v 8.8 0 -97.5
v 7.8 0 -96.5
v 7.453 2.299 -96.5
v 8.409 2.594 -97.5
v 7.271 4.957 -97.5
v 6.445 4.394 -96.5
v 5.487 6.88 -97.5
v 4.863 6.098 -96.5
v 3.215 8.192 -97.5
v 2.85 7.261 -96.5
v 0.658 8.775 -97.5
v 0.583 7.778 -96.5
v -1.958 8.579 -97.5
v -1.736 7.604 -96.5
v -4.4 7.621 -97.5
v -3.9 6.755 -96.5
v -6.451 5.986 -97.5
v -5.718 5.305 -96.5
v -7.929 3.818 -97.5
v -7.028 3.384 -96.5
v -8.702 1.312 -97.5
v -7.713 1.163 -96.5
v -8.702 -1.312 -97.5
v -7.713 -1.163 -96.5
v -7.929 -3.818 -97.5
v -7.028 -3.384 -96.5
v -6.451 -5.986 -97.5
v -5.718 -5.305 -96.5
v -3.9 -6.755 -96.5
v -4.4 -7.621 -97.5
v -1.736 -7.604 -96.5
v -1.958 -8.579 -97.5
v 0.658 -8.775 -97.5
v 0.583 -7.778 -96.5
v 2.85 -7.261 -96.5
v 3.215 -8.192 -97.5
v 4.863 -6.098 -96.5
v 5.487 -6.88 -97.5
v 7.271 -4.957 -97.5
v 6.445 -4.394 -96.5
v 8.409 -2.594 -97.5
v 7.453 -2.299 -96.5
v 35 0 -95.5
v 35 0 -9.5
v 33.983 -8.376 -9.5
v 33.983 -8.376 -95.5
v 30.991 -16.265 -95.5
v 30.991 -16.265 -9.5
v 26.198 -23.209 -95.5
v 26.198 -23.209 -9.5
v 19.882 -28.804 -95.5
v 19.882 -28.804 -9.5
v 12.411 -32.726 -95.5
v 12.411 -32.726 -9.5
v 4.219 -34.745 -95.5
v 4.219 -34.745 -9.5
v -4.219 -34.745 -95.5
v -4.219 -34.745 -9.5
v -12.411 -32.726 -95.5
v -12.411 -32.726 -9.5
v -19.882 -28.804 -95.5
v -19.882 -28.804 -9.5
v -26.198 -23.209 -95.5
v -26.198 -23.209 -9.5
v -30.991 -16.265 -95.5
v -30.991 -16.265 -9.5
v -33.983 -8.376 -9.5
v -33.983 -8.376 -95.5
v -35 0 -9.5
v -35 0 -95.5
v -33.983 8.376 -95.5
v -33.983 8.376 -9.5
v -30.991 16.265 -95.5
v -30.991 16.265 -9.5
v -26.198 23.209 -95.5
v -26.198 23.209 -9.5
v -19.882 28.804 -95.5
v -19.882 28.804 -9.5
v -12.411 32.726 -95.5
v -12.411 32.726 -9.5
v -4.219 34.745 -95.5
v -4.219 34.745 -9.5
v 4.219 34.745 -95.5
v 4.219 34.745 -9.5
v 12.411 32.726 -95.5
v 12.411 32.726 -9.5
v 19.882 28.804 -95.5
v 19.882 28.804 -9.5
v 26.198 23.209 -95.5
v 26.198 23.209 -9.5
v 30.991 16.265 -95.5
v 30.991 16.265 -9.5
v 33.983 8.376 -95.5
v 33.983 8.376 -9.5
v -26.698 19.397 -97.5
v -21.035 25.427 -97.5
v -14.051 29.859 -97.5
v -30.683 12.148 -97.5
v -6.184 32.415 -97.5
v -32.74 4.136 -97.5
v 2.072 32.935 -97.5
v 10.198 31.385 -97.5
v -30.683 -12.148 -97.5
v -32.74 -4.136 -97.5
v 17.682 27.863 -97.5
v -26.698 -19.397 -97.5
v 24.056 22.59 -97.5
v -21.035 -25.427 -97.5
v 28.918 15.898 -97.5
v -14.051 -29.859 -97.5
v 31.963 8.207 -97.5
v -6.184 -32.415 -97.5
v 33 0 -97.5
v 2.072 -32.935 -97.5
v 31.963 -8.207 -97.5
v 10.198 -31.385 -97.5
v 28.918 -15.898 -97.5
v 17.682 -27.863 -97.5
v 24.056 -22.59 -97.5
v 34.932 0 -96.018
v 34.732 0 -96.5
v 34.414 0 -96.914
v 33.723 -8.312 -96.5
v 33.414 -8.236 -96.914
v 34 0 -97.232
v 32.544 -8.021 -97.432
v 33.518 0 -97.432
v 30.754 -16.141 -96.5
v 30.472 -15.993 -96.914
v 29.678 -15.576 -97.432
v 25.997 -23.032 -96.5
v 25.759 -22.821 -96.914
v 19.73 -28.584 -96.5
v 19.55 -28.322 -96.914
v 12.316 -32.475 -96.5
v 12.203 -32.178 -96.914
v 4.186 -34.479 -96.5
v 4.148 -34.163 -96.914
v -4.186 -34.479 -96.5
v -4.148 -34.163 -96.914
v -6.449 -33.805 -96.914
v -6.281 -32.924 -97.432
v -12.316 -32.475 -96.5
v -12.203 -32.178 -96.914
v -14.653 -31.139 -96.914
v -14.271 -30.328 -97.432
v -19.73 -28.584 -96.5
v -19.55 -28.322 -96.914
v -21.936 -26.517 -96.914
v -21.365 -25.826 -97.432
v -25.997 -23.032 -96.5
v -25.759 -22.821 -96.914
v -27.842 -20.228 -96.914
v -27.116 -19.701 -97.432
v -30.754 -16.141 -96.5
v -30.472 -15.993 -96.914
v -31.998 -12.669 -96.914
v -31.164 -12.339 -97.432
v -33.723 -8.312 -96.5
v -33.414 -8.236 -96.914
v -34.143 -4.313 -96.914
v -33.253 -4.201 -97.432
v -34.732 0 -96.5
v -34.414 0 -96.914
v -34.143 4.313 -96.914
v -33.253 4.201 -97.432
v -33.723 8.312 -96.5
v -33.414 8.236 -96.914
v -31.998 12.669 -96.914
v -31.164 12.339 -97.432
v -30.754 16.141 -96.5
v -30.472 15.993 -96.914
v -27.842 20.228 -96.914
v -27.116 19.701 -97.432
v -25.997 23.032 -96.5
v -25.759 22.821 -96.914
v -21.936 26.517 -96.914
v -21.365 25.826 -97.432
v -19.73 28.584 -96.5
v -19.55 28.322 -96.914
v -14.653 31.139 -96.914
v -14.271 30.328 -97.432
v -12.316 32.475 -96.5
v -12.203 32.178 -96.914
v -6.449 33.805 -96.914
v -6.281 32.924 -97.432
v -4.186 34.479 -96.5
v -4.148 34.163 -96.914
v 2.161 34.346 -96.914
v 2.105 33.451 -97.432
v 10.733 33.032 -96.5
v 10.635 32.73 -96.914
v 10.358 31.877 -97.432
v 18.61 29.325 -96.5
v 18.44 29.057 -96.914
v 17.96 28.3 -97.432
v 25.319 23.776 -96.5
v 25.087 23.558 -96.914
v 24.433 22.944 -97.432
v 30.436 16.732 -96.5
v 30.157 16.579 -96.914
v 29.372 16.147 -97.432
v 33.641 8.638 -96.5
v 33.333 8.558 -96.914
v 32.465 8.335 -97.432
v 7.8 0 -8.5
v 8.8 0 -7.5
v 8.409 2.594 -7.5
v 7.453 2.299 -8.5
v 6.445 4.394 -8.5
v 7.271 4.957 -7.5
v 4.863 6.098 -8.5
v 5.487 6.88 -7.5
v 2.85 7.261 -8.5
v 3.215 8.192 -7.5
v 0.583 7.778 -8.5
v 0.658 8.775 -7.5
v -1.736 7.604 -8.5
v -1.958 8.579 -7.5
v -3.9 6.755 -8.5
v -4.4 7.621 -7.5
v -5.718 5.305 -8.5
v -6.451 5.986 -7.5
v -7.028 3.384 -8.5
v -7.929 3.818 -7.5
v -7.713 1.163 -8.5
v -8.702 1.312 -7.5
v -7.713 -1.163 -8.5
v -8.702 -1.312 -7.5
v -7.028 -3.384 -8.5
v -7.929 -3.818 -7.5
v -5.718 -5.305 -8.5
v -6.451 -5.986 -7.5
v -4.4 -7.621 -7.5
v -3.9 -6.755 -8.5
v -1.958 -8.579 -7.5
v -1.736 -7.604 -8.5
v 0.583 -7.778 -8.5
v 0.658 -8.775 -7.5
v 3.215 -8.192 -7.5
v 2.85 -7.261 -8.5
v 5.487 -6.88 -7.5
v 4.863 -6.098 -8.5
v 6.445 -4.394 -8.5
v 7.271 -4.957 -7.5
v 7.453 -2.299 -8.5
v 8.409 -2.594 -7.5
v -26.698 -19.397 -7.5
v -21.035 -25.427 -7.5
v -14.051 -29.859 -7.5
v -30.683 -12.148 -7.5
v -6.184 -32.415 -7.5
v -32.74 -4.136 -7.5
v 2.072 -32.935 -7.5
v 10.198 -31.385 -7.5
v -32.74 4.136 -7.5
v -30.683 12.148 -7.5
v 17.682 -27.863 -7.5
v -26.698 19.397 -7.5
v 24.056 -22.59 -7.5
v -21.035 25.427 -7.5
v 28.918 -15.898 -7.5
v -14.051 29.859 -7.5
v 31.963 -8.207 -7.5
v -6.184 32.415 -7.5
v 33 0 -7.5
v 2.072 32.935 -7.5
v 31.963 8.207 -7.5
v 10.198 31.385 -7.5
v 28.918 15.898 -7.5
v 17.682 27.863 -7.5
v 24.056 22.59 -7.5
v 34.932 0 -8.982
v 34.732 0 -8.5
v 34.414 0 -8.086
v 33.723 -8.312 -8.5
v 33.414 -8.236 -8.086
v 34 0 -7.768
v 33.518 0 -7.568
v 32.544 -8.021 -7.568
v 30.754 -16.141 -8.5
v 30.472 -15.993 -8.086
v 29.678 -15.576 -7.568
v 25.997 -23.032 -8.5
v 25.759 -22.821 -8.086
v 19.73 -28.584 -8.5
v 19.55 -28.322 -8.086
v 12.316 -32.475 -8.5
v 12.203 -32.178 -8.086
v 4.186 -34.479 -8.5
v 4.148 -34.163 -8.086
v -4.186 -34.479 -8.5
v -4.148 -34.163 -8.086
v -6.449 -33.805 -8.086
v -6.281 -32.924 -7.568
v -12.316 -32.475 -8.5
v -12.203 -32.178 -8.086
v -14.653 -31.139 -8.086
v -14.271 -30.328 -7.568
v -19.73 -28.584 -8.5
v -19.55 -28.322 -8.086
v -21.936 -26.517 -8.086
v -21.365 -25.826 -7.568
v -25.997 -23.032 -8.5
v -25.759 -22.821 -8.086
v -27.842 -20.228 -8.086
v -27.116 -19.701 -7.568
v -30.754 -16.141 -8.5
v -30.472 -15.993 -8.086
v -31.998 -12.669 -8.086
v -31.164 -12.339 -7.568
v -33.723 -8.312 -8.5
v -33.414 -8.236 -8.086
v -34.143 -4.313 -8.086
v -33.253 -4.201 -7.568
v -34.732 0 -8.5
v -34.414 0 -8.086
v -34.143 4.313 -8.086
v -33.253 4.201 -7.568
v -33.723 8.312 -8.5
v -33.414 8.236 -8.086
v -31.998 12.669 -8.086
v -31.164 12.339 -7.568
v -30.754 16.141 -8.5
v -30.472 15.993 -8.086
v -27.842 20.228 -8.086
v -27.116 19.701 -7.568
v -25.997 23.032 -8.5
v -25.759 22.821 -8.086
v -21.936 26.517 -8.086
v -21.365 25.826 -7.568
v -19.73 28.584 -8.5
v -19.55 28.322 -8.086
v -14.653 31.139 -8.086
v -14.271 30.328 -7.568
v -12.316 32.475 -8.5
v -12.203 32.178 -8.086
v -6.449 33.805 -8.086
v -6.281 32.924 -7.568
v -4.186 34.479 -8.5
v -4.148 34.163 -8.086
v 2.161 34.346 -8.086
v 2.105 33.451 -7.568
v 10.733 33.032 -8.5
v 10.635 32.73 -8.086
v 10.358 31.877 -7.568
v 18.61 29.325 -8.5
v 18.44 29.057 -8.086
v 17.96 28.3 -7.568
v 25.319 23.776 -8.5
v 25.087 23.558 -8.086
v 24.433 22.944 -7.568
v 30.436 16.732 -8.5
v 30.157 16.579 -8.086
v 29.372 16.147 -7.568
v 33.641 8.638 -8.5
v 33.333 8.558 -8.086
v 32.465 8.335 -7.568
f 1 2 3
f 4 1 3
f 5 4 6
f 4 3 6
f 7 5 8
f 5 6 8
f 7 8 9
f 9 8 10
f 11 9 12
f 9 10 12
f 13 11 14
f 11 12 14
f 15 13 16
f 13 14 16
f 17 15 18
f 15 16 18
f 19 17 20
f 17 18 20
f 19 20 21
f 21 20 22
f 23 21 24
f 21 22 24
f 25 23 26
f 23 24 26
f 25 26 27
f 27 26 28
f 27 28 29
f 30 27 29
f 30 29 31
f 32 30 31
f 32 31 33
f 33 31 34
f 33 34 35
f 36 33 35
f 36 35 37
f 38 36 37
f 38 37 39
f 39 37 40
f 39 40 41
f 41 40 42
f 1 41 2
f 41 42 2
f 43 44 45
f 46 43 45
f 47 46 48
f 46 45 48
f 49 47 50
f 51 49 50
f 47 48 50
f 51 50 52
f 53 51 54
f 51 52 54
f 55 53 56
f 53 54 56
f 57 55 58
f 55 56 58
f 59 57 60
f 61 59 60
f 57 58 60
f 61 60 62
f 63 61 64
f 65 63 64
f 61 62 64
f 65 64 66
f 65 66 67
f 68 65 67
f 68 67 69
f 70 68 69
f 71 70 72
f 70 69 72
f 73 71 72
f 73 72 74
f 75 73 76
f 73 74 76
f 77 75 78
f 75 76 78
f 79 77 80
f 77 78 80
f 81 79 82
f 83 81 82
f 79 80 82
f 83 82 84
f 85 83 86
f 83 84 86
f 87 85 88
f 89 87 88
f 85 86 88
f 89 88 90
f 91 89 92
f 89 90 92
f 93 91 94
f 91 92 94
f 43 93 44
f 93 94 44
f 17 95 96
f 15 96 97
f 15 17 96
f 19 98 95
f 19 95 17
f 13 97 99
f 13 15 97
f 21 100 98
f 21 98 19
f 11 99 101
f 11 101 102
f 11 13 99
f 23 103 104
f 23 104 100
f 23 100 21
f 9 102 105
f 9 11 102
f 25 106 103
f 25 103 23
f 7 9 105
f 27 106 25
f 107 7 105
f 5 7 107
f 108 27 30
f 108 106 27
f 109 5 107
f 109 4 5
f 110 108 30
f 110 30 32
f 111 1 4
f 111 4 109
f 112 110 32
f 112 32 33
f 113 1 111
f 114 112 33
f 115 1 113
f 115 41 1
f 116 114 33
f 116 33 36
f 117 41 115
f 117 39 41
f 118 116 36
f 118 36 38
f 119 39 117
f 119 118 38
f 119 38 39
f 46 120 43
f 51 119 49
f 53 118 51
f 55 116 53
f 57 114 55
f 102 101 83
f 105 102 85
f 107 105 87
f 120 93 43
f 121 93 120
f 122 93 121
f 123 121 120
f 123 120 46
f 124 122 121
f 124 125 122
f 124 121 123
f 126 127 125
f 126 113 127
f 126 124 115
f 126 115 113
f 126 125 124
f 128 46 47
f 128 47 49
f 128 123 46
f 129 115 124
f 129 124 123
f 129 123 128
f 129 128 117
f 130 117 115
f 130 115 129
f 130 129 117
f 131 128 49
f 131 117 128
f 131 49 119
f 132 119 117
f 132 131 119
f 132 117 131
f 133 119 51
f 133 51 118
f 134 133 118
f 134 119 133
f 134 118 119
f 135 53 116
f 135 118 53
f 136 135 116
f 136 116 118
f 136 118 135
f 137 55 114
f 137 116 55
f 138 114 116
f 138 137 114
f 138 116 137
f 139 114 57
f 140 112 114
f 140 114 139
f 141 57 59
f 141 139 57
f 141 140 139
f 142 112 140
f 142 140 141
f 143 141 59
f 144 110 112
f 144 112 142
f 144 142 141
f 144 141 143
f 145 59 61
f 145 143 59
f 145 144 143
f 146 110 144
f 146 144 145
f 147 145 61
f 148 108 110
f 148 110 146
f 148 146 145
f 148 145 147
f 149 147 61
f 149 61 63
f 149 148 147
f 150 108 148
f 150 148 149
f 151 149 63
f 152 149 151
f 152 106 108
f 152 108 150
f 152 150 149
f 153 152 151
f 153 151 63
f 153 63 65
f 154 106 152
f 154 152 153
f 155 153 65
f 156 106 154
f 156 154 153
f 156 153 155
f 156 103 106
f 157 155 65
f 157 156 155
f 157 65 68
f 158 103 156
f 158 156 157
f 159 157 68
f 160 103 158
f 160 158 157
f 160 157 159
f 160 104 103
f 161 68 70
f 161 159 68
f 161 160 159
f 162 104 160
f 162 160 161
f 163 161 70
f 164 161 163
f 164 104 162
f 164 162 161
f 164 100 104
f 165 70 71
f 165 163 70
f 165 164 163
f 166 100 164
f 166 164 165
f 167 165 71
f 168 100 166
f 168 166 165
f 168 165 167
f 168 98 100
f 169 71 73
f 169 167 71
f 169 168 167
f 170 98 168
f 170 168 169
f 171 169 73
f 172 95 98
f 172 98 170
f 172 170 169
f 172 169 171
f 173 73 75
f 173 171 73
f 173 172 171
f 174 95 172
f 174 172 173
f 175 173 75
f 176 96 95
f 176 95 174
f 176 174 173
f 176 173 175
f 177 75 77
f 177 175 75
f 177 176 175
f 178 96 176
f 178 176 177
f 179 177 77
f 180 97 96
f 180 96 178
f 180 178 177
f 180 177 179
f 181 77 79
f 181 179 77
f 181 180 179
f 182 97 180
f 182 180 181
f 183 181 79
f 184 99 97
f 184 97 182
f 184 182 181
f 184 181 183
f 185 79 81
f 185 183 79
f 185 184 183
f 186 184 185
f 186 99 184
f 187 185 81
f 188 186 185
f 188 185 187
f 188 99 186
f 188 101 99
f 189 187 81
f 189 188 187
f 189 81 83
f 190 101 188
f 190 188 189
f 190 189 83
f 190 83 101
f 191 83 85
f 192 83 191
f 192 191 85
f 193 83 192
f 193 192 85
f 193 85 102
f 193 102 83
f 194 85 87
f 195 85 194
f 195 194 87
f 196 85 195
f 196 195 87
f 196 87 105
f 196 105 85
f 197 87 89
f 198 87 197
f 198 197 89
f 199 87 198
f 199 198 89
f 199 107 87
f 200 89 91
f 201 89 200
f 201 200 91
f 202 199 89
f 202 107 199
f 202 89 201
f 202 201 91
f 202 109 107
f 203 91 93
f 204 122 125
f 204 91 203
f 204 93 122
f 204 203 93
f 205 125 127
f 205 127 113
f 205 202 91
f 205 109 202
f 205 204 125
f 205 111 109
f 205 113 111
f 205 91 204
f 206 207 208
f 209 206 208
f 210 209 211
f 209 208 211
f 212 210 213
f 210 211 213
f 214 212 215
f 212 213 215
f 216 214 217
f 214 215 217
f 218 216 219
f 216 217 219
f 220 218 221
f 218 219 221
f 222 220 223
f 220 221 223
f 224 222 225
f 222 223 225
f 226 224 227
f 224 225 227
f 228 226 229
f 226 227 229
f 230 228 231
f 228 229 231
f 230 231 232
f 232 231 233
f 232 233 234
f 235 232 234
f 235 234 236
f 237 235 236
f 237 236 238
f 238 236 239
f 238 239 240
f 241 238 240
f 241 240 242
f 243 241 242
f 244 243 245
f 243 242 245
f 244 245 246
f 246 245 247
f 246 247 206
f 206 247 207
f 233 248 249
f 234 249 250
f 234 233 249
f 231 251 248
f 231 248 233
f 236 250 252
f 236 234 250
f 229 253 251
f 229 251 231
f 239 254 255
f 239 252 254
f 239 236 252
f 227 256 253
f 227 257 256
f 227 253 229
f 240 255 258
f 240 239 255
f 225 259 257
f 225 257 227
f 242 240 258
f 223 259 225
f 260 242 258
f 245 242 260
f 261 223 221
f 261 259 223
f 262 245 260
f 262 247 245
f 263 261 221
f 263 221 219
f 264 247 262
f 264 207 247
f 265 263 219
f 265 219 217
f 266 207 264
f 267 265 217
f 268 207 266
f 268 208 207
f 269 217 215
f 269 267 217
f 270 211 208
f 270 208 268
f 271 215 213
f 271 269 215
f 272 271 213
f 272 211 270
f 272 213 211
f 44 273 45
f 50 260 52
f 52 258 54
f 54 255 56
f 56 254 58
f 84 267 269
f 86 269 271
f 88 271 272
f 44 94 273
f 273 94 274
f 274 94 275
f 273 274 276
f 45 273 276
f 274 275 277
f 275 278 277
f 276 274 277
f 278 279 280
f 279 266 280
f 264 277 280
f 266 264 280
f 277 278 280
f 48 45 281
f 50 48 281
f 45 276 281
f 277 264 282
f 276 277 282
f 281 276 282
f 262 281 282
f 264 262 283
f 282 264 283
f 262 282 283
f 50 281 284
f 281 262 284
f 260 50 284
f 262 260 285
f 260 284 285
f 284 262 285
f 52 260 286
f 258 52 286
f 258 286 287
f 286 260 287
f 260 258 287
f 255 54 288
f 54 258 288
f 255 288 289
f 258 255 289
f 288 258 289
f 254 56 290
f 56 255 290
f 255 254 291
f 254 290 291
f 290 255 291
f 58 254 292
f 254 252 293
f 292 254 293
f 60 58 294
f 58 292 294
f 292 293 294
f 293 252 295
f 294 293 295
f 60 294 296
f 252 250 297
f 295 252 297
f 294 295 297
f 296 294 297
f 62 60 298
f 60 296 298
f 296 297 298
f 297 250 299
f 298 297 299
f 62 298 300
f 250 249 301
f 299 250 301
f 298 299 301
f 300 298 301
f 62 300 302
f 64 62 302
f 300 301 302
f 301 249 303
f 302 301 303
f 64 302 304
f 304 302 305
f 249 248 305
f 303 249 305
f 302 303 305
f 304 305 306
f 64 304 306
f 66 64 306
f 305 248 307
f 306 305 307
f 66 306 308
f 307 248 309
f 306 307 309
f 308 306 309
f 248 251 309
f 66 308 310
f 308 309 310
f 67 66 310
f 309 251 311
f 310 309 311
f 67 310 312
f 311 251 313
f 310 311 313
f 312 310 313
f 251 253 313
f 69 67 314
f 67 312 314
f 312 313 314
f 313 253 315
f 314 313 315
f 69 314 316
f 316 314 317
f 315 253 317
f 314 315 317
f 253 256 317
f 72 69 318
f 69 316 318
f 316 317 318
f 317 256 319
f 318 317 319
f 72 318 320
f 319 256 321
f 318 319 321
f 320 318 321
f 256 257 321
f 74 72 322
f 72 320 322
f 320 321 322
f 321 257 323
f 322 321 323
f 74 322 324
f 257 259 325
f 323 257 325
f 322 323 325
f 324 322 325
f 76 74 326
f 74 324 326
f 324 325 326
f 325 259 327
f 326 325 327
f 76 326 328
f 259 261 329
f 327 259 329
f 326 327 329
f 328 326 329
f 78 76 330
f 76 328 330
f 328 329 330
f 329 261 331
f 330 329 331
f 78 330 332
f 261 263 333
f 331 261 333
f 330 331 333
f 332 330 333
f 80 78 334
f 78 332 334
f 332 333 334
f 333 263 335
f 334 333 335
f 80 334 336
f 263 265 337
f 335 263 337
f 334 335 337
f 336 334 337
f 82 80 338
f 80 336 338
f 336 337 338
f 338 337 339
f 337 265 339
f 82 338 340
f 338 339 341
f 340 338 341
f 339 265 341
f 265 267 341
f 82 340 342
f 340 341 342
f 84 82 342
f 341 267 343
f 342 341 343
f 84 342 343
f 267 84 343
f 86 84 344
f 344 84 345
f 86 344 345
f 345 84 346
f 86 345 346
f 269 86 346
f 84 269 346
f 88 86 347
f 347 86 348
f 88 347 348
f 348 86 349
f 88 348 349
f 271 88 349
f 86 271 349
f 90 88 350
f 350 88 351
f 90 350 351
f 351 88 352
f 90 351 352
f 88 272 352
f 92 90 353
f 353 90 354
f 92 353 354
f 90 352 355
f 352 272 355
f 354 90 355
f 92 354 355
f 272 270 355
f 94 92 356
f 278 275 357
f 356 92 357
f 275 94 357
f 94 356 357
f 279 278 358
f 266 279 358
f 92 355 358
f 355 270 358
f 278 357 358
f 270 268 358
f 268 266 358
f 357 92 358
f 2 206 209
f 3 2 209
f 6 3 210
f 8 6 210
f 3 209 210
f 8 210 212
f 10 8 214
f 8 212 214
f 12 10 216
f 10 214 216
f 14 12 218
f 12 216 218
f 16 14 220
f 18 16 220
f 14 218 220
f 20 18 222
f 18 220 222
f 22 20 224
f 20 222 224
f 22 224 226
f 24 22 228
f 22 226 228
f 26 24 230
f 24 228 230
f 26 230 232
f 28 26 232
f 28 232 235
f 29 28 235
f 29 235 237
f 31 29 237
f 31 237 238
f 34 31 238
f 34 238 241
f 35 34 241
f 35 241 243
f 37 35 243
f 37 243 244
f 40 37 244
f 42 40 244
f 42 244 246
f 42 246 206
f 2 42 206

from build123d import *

# Parameters (mm, degrees)
EXTRUDE_1_DEPTH             = 5.5
SKETCH_2_R                  = 20
EXTRUDE_2_DEPTH             = 2
CHAMFER_1_SIZE              = 1.5
CHAMFER_1_SIZE2             = 1.787630389
CHAMFER_1_OF_MIRROR_1_SIZE2 = 1.5
CHAMFER_1_OF_MIRROR_1_SIZE  = 1.787630389
SKETCH_3_R                  = 3.4
CUT_EXTRUDE_1_DEPTH         = 30
SKETCH_8_R                  = 35
EXTRUDE_3_DEPTH             = 90
CUT_EXTRUDE_START           = -163
SKETCH_9_R                  = 3.4
CUT_EXTRUDE_2_DEPTH         = 163
FILLET_1_R                  = 2
SKETCH_10_R                 = 7.8
CUT_EXTRUDE_3_DEPTH         = 163
CHAMFER_2_SIZE              = 1
SKETCH_11_R                 = 106.702897297
CUT_EXTRUDE_4_DEPTH         = 322
CHAMFER_3_SIZE              = 1


with BuildPart() as part:
    # 스케치1 → 보스-돌출1 (new, symmetric)
    with BuildSketch(Plane.XY):
        with BuildLine():
            Line((12.279067203, 9.260056493), (13.72951471, 11.331510209))
            ThreePointArc((13.72951471, 11.331510209), (13.819231237, 11.644886966), (13.696740348, 11.946963163))
            ThreePointArc((13.696740348, 11.946963163), (12.880233507, 12.823034344), (12.007805037, 13.643432236))
            ThreePointArc((12.007805037, 13.643432236), (11.644638313, 13.792108644), (11.267252957, 13.684521298))
            Line((11.267252957, 13.684521298), (9.202645163, 12.238867358))
            ThreePointArc((9.202645163, 12.238867358), (8.915071795, 12.148443996), (8.627783828, 12.239770064))
            ThreePointArc((8.627783828, 12.239770064), (7.516754209, 12.951796446), (6.347354905, 13.563248531))
            ThreePointArc((6.347354905, 13.563248531), (6.081851507, 13.807041329), (6.003955886, 14.158977765))
            Line((6.003955886, 14.158977765), (6.224353416, 16.678133059))
            ThreePointArc((6.224353416, 16.678133059), (6.145361829, 16.994383555), (5.888243509, 17.194743772))
            ThreePointArc((5.888243509, 17.194743772), (4.743092252, 17.54519025), (3.577348088, 17.81946143))
            ThreePointArc((3.577348088, 17.81946143), (3.188498275, 17.766635614), (2.915466643, 17.484769561))
            Line((2.915466643, 17.484769561), (1.850290815, 15.200492627))
            ThreePointArc((1.850290815, 15.200492627), (1.646456756, 14.978397074), (1.351995179, 14.913843704))
            ThreePointArc((1.351995179, 14.913843704), (0.033801995, 14.974961851), (-1.284653671, 14.919795238))
            ThreePointArc((-1.284653671, 14.919795238), (-1.636482757, 14.998174295), (-1.879910562, 15.26401238))
            Line((-1.879910562, 15.26401238), (-2.948618349, 17.555863625))
            ThreePointArc((-2.948618349, 17.555863625), (-3.175152318, 17.790248795), (-3.498003423, 17.835206672))
            ThreePointArc((-3.498003423, 17.835206672), (-4.664956742, 17.566126596), (-5.811656393, 17.220780324))
            ThreePointArc((-5.811656393, 17.220780324), (-6.121997301, 16.980606919), (-6.217516604, 16.599987941))
            Line((-6.217516604, 16.599987941), (-5.997847464, 14.089158172))
            ThreePointArc((-5.997847464, 14.089158172), (-6.06332522, 13.794900649), (-6.286059898, 13.591765005))
            ThreePointArc((-6.286059898, 13.591765005), (-7.458207642, 12.985598321), (-8.572440333, 12.27859486))
            ThreePointArc((-8.572440333, 12.27859486), (-8.916322788, 12.170558572), (-9.260056493, 12.279067203))
            Line((-9.260056493, 12.279067203), (-11.331510209, 13.72951471))
            ThreePointArc((-11.331510209, 13.72951471), (-11.644886966, 13.819231237), (-11.946963163, 13.696740348))
            ThreePointArc((-11.946963163, 13.696740348), (-12.823034344, 12.880233507), (-13.643432236, 12.007805037))
            ThreePointArc((-13.643432236, 12.007805037), (-13.792108644, 11.644638313), (-13.684521298, 11.267252957))
            Line((-13.684521298, 11.267252957), (-12.238867358, 9.202645163))
            ThreePointArc((-12.238867358, 9.202645163), (-12.148443996, 8.915071795), (-12.239770064, 8.627783828))
            ThreePointArc((-12.239770064, 8.627783828), (-12.951796446, 7.516754209), (-13.563248531, 6.347354905))
            ThreePointArc((-13.563248531, 6.347354905), (-13.807041329, 6.081851507), (-14.158977765, 6.003955886))
            Line((-14.158977765, 6.003955886), (-16.678133059, 6.224353416))
            ThreePointArc((-16.678133059, 6.224353416), (-16.994383555, 6.145361829), (-17.194743772, 5.888243509))
            ThreePointArc((-17.194743772, 5.888243509), (-17.54519025, 4.743092252), (-17.81946143, 3.577348088))
            ThreePointArc((-17.81946143, 3.577348088), (-17.766635614, 3.188498275), (-17.484769561, 2.915466643))
            Line((-17.484769561, 2.915466643), (-15.200492627, 1.850290815))
            ThreePointArc((-15.200492627, 1.850290815), (-14.978397015, 1.646456653), (-14.913843726, 1.351994942))
            ThreePointArc((-14.913843726, 1.351994942), (-14.974961851, 0.033801876), (-14.919795238, -1.284653671))
            ThreePointArc((-14.919795238, -1.284653671), (-14.998174295, -1.636482757), (-15.26401238, -1.879910562))
            Line((-15.26401238, -1.879910562), (-17.555863625, -2.948618349))
            ThreePointArc((-17.555863625, -2.948618349), (-17.790248795, -3.175152318), (-17.835206672, -3.498003423))
            ThreePointArc((-17.835206672, -3.498003423), (-17.566126596, -4.664956742), (-17.220780324, -5.811656393))
            ThreePointArc((-17.220780324, -5.811656393), (-16.980606919, -6.121997301), (-16.599987941, -6.217516604))
            Line((-16.599987941, -6.217516604), (-14.089158172, -5.997847464))
            ThreePointArc((-14.089158172, -5.997847464), (-13.794900649, -6.06332522), (-13.591765005, -6.286059898))
            ThreePointArc((-13.591765005, -6.286059898), (-12.985598321, -7.458207642), (-12.27859486, -8.572440333))
            ThreePointArc((-12.27859486, -8.572440333), (-12.170558572, -8.916322788), (-12.279067203, -9.260056493))
            Line((-12.279067203, -9.260056493), (-13.72951471, -11.331510209))
            ThreePointArc((-13.72951471, -11.331510209), (-13.819231237, -11.644886966), (-13.696740348, -11.946963163))
            ThreePointArc((-13.696740348, -11.946963163), (-12.880233507, -12.823034344), (-12.007805037, -13.643432236))
            ThreePointArc((-12.007805037, -13.643432236), (-11.644638313, -13.792108644), (-11.267252957, -13.684521298))
            Line((-11.267252957, -13.684521298), (-9.202645163, -12.238867358))
            ThreePointArc((-9.202645163, -12.238867358), (-8.915071795, -12.148443996), (-8.627783828, -12.239770064))
            ThreePointArc((-8.627783828, -12.239770064), (-7.516754209, -12.951796446), (-6.347354905, -13.563248531))
            ThreePointArc((-6.347354905, -13.563248531), (-6.081851507, -13.807041329), (-6.003955886, -14.158977765))
            Line((-6.003955886, -14.158977765), (-6.224353416, -16.678133059))
            ThreePointArc((-6.224353416, -16.678133059), (-6.145361829, -16.994383555), (-5.888243509, -17.194743772))
            ThreePointArc((-5.888243509, -17.194743772), (-4.743092252, -17.54519025), (-3.577348088, -17.81946143))
            ThreePointArc((-3.577348088, -17.81946143), (-3.188498275, -17.766635614), (-2.915466643, -17.484769561))
            Line((-2.915466643, -17.484769561), (-1.850290815, -15.200492627))
            ThreePointArc((-1.850290815, -15.200492627), (-1.646456653, -14.978397015), (-1.351994942, -14.913843726))
            ThreePointArc((-1.351994942, -14.913843726), (-0.033801876, -14.974961851), (1.284653671, -14.919795238))
            ThreePointArc((1.284653671, -14.919795238), (1.636482757, -14.998174295), (1.879910562, -15.26401238))
            Line((1.879910562, -15.26401238), (2.948618349, -17.555863625))
            ThreePointArc((2.948618349, -17.555863625), (3.175152318, -17.790248795), (3.498003423, -17.835206672))
            ThreePointArc((3.498003423, -17.835206672), (4.664956742, -17.566126596), (5.811656393, -17.220780324))
            ThreePointArc((5.811656393, -17.220780324), (6.121997301, -16.980606919), (6.217516604, -16.599987941))
            Line((6.217516604, -16.599987941), (5.997847464, -14.089158172))
            ThreePointArc((5.997847464, -14.089158172), (6.06332522, -13.794900649), (6.286059898, -13.591765005))
            ThreePointArc((6.286059898, -13.591765005), (7.458207642, -12.985598321), (8.572440333, -12.27859486))
            ThreePointArc((8.572440333, -12.27859486), (8.916322788, -12.170558572), (9.260056493, -12.279067203))
            Line((9.260056493, -12.279067203), (11.331510209, -13.72951471))
            ThreePointArc((11.331510209, -13.72951471), (11.644886966, -13.819231237), (11.946963163, -13.696740348))
            ThreePointArc((11.946963163, -13.696740348), (12.823034344, -12.880233507), (13.643432236, -12.007805037))
            ThreePointArc((13.643432236, -12.007805037), (13.792108644, -11.644638313), (13.684521298, -11.267252957))
            Line((13.684521298, -11.267252957), (12.238867358, -9.202645163))
            ThreePointArc((12.238867358, -9.202645163), (12.148443996, -8.915071914), (12.239769926, -8.627784023))
            ThreePointArc((12.239769926, -8.627784023), (12.951796386, -7.516754312), (13.563248531, -6.347354905))
            ThreePointArc((13.563248531, -6.347354905), (13.807041329, -6.081851507), (14.158977765, -6.003955886))
            Line((14.158977765, -6.003955886), (16.678133059, -6.224353416))
            ThreePointArc((16.678133059, -6.224353416), (16.994383555, -6.145361829), (17.194743772, -5.888243509))
            ThreePointArc((17.194743772, -5.888243509), (17.54519025, -4.743092252), (17.81946143, -3.577348088))
            ThreePointArc((17.81946143, -3.577348088), (17.766635614, -3.188498275), (17.484769561, -2.915466643))
            Line((17.484769561, -2.915466643), (15.200492627, -1.850290815))
            ThreePointArc((15.200492627, -1.850290815), (14.978397015, -1.646456653), (14.913843726, -1.351994942))
            ThreePointArc((14.913843726, -1.351994942), (14.974961851, -0.033801876), (14.919795238, 1.284653671))
            ThreePointArc((14.919795238, 1.284653671), (14.998174295, 1.636482757), (15.26401238, 1.879910562))
            Line((15.26401238, 1.879910562), (17.555863625, 2.948618349))
            ThreePointArc((17.555863625, 2.948618349), (17.790248795, 3.175152318), (17.835206672, 3.498003423))
            ThreePointArc((17.835206672, 3.498003423), (17.566126596, 4.664956742), (17.220780324, 5.811656393))
            ThreePointArc((17.220780324, 5.811656393), (16.980606919, 6.121997301), (16.599987941, 6.217516604))
            Line((16.599987941, 6.217516604), (14.089158172, 5.997847464))
            ThreePointArc((14.089158172, 5.997847464), (13.794900649, 6.06332522), (13.591765005, 6.286059898))
            ThreePointArc((13.591765005, 6.286059898), (12.985598253, 7.458207762), (12.278594702, 8.572440559))
            ThreePointArc((12.278594702, 8.572440559), (12.170558572, 8.916322926), (12.279067203, 9.260056493))
        make_face()
    extrude(amount=EXTRUDE_1_DEPTH, both=True)

    # 스케치2 → 보스-돌출2 (add)
    with BuildSketch(Plane.XY.offset(5.5)):
        Circle(SKETCH_2_R)
    extrude_2 = extrude(amount=EXTRUDE_2_DEPTH)

    # 모따기1
    chamfer_1_edges = [part.edges().sort_by_distance(p)[0] for p in [
        (-20, 0, 5.5),
    ]]
    chamfer_1_side = [part.faces().sort_by_distance(p)[0] for p in [
        (-20, 0, 6.5),
    ]]
    chamfer(chamfer_1_edges, length=CHAMFER_1_SIZE, length2=CHAMFER_1_SIZE2, reference=chamfer_1_side[0])

    # 대칭 복사1: 보스-돌출2 across plane
    add(extrude_2.mirror(Plane.XY))

    # 모따기1 of 대칭 복사1
    chamfer_1_of_mirror_1_edges = [part.edges().sort_by_distance(p)[0] for p in [
        (-20, 0, -5.5),
    ]]
    chamfer(chamfer_1_of_mirror_1_edges, length=CHAMFER_1_OF_MIRROR_1_SIZE, length2=CHAMFER_1_OF_MIRROR_1_SIZE2)

    # 스케치3 → 컷-돌출1 (cut)
    with BuildSketch(Plane(origin=(0, 0, -7.5), x_dir=(-1, 0, 0), z_dir=(0, 0, -1))):
        Circle(SKETCH_3_R)
    extrude(amount=-CUT_EXTRUDE_1_DEPTH, mode=Mode.SUBTRACT)

    # 스케치8 → 보스-돌출3 (add)
    with BuildSketch(Plane(origin=(0, 0, -7.5), x_dir=(-1, 0, 0), z_dir=(0, 0, -1))):
        with Locations(Location((0, 0, 0), (0, 0, 180))):
            Circle(SKETCH_8_R)
    extrude(amount=EXTRUDE_3_DEPTH)

    # 스케치9 → 컷-돌출2 (cut)
    with BuildSketch(Plane.XY.offset(7.5).offset(CUT_EXTRUDE_START)):
        with Locations(Location((0, 0, 0), (0, 0, 180))):
            Circle(SKETCH_9_R)
    extrude(amount=CUT_EXTRUDE_2_DEPTH, mode=Mode.SUBTRACT)

    # 필렛1
    fillet_1_edges = [part.edges().sort_by_distance(p)[0] for p in [
        (-35, 0, -7.5),
        (-35, 0, -97.5),
    ]]
    fillet(fillet_1_edges, radius=FILLET_1_R)

    # 스케치10 → 컷-돌출3 (cut)
    with BuildSketch(Plane.XY.offset(7.5)):
        Circle(SKETCH_10_R)
    extrude(amount=-CUT_EXTRUDE_3_DEPTH, mode=Mode.SUBTRACT)

    # 모따기2
    chamfer_2_edges = [part.edges().sort_by_distance(p)[0] for p in [
        (-7.8, 0, 7.5),
        (-7.8, 0, -97.5),
    ]]
    chamfer(chamfer_2_edges, length=CHAMFER_2_SIZE)

    # 스케치11 → 컷-돌출4 (cut)
    with BuildSketch(Plane.XY.offset(-7.5)):
        Circle(SKETCH_11_R)
    extrude(amount=CUT_EXTRUDE_4_DEPTH, mode=Mode.SUBTRACT)

    # 모따기3
    chamfer_3_edges = [part.edges().sort_by_distance(p)[0] for p in [
        (-7.8, 0, -7.5),
    ]]
    chamfer(chamfer_3_edges, length=CHAMFER_3_SIZE)


solid = part.part
